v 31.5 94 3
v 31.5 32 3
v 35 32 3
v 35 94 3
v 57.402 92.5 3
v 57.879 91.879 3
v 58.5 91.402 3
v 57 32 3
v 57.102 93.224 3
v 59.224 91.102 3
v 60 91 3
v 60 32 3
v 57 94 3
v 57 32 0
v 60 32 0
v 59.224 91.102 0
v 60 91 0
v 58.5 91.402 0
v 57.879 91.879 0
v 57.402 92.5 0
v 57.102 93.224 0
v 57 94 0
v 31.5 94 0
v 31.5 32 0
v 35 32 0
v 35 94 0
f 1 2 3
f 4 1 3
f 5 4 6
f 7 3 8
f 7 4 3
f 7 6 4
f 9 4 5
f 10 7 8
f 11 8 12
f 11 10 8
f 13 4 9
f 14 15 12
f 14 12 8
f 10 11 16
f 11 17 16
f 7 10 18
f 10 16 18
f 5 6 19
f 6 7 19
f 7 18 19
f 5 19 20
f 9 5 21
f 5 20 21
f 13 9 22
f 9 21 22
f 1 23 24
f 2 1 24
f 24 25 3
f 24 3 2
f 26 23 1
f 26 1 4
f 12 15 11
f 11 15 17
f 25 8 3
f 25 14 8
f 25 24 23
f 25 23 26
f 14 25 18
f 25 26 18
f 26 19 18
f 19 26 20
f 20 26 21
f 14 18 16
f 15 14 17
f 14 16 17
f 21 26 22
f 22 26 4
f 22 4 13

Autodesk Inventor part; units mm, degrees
ref_plane "YZ Plane" through (0, 0, 0) normal (1, 0, 0) x (0, 1, 0)
ref_plane "XZ Plane" through (0, 0, 0) normal (0, 1, 0) x (-1, 0, 0)
ref_plane "XY Plane" through (0, 0, 0) normal (0, 0, 1) x (1, 0, 0)
sketch "Sketch1" plane through (0, 0, 0) normal (0, 0, 1) x (1, 0, 0)
  line L0 (60, 32) -> (-60, 32) projected
  line L1 (31.5, 94) -> (31.5, 32) projected
  line L2 (60, -26) -> (60, 94) projected
  line L3 (-63, 94) -> (63, 94) projected
  line L4 (31.5, 94) -> (60, 94)
  line L5 (60, 94) -> (60, 32)
  line L6 (60, 32) -> (31.5, 32)
  line L7 (31.5, 32) -> (31.5, 94)
  line L8 (57, 97) -> (57, 94) projected
  line L9 (57, 97) -> (35, 97)
  line L10 (35, 97) -> (35, 94)
  line L11 (35, 32) -> (35, 29)
  line L12 (35, 29) -> (57, 29)
  line L13 (57, 29) -> (57, 32)
  arc A0 (57, 94) -> (60, 91) centre (60, 94) ccw
  line L14 (57, 94) -> (60, 91) construction
  line L15 (57, 94) -> (61.2426, 94) construction
  point P0 (0, 0)
  point P1 (60, 91)
  point P2 (31.5, 94)
  dimension "d0" = 22
  dimension "d1" = 3
  dimension "d2" = 45
  dimension "d3" = 3
extrude "Extrusion1" add sketch "Sketch1" along normal blind 3 contours L0 L1 L3 A0 L2
properties part number "shelf"
